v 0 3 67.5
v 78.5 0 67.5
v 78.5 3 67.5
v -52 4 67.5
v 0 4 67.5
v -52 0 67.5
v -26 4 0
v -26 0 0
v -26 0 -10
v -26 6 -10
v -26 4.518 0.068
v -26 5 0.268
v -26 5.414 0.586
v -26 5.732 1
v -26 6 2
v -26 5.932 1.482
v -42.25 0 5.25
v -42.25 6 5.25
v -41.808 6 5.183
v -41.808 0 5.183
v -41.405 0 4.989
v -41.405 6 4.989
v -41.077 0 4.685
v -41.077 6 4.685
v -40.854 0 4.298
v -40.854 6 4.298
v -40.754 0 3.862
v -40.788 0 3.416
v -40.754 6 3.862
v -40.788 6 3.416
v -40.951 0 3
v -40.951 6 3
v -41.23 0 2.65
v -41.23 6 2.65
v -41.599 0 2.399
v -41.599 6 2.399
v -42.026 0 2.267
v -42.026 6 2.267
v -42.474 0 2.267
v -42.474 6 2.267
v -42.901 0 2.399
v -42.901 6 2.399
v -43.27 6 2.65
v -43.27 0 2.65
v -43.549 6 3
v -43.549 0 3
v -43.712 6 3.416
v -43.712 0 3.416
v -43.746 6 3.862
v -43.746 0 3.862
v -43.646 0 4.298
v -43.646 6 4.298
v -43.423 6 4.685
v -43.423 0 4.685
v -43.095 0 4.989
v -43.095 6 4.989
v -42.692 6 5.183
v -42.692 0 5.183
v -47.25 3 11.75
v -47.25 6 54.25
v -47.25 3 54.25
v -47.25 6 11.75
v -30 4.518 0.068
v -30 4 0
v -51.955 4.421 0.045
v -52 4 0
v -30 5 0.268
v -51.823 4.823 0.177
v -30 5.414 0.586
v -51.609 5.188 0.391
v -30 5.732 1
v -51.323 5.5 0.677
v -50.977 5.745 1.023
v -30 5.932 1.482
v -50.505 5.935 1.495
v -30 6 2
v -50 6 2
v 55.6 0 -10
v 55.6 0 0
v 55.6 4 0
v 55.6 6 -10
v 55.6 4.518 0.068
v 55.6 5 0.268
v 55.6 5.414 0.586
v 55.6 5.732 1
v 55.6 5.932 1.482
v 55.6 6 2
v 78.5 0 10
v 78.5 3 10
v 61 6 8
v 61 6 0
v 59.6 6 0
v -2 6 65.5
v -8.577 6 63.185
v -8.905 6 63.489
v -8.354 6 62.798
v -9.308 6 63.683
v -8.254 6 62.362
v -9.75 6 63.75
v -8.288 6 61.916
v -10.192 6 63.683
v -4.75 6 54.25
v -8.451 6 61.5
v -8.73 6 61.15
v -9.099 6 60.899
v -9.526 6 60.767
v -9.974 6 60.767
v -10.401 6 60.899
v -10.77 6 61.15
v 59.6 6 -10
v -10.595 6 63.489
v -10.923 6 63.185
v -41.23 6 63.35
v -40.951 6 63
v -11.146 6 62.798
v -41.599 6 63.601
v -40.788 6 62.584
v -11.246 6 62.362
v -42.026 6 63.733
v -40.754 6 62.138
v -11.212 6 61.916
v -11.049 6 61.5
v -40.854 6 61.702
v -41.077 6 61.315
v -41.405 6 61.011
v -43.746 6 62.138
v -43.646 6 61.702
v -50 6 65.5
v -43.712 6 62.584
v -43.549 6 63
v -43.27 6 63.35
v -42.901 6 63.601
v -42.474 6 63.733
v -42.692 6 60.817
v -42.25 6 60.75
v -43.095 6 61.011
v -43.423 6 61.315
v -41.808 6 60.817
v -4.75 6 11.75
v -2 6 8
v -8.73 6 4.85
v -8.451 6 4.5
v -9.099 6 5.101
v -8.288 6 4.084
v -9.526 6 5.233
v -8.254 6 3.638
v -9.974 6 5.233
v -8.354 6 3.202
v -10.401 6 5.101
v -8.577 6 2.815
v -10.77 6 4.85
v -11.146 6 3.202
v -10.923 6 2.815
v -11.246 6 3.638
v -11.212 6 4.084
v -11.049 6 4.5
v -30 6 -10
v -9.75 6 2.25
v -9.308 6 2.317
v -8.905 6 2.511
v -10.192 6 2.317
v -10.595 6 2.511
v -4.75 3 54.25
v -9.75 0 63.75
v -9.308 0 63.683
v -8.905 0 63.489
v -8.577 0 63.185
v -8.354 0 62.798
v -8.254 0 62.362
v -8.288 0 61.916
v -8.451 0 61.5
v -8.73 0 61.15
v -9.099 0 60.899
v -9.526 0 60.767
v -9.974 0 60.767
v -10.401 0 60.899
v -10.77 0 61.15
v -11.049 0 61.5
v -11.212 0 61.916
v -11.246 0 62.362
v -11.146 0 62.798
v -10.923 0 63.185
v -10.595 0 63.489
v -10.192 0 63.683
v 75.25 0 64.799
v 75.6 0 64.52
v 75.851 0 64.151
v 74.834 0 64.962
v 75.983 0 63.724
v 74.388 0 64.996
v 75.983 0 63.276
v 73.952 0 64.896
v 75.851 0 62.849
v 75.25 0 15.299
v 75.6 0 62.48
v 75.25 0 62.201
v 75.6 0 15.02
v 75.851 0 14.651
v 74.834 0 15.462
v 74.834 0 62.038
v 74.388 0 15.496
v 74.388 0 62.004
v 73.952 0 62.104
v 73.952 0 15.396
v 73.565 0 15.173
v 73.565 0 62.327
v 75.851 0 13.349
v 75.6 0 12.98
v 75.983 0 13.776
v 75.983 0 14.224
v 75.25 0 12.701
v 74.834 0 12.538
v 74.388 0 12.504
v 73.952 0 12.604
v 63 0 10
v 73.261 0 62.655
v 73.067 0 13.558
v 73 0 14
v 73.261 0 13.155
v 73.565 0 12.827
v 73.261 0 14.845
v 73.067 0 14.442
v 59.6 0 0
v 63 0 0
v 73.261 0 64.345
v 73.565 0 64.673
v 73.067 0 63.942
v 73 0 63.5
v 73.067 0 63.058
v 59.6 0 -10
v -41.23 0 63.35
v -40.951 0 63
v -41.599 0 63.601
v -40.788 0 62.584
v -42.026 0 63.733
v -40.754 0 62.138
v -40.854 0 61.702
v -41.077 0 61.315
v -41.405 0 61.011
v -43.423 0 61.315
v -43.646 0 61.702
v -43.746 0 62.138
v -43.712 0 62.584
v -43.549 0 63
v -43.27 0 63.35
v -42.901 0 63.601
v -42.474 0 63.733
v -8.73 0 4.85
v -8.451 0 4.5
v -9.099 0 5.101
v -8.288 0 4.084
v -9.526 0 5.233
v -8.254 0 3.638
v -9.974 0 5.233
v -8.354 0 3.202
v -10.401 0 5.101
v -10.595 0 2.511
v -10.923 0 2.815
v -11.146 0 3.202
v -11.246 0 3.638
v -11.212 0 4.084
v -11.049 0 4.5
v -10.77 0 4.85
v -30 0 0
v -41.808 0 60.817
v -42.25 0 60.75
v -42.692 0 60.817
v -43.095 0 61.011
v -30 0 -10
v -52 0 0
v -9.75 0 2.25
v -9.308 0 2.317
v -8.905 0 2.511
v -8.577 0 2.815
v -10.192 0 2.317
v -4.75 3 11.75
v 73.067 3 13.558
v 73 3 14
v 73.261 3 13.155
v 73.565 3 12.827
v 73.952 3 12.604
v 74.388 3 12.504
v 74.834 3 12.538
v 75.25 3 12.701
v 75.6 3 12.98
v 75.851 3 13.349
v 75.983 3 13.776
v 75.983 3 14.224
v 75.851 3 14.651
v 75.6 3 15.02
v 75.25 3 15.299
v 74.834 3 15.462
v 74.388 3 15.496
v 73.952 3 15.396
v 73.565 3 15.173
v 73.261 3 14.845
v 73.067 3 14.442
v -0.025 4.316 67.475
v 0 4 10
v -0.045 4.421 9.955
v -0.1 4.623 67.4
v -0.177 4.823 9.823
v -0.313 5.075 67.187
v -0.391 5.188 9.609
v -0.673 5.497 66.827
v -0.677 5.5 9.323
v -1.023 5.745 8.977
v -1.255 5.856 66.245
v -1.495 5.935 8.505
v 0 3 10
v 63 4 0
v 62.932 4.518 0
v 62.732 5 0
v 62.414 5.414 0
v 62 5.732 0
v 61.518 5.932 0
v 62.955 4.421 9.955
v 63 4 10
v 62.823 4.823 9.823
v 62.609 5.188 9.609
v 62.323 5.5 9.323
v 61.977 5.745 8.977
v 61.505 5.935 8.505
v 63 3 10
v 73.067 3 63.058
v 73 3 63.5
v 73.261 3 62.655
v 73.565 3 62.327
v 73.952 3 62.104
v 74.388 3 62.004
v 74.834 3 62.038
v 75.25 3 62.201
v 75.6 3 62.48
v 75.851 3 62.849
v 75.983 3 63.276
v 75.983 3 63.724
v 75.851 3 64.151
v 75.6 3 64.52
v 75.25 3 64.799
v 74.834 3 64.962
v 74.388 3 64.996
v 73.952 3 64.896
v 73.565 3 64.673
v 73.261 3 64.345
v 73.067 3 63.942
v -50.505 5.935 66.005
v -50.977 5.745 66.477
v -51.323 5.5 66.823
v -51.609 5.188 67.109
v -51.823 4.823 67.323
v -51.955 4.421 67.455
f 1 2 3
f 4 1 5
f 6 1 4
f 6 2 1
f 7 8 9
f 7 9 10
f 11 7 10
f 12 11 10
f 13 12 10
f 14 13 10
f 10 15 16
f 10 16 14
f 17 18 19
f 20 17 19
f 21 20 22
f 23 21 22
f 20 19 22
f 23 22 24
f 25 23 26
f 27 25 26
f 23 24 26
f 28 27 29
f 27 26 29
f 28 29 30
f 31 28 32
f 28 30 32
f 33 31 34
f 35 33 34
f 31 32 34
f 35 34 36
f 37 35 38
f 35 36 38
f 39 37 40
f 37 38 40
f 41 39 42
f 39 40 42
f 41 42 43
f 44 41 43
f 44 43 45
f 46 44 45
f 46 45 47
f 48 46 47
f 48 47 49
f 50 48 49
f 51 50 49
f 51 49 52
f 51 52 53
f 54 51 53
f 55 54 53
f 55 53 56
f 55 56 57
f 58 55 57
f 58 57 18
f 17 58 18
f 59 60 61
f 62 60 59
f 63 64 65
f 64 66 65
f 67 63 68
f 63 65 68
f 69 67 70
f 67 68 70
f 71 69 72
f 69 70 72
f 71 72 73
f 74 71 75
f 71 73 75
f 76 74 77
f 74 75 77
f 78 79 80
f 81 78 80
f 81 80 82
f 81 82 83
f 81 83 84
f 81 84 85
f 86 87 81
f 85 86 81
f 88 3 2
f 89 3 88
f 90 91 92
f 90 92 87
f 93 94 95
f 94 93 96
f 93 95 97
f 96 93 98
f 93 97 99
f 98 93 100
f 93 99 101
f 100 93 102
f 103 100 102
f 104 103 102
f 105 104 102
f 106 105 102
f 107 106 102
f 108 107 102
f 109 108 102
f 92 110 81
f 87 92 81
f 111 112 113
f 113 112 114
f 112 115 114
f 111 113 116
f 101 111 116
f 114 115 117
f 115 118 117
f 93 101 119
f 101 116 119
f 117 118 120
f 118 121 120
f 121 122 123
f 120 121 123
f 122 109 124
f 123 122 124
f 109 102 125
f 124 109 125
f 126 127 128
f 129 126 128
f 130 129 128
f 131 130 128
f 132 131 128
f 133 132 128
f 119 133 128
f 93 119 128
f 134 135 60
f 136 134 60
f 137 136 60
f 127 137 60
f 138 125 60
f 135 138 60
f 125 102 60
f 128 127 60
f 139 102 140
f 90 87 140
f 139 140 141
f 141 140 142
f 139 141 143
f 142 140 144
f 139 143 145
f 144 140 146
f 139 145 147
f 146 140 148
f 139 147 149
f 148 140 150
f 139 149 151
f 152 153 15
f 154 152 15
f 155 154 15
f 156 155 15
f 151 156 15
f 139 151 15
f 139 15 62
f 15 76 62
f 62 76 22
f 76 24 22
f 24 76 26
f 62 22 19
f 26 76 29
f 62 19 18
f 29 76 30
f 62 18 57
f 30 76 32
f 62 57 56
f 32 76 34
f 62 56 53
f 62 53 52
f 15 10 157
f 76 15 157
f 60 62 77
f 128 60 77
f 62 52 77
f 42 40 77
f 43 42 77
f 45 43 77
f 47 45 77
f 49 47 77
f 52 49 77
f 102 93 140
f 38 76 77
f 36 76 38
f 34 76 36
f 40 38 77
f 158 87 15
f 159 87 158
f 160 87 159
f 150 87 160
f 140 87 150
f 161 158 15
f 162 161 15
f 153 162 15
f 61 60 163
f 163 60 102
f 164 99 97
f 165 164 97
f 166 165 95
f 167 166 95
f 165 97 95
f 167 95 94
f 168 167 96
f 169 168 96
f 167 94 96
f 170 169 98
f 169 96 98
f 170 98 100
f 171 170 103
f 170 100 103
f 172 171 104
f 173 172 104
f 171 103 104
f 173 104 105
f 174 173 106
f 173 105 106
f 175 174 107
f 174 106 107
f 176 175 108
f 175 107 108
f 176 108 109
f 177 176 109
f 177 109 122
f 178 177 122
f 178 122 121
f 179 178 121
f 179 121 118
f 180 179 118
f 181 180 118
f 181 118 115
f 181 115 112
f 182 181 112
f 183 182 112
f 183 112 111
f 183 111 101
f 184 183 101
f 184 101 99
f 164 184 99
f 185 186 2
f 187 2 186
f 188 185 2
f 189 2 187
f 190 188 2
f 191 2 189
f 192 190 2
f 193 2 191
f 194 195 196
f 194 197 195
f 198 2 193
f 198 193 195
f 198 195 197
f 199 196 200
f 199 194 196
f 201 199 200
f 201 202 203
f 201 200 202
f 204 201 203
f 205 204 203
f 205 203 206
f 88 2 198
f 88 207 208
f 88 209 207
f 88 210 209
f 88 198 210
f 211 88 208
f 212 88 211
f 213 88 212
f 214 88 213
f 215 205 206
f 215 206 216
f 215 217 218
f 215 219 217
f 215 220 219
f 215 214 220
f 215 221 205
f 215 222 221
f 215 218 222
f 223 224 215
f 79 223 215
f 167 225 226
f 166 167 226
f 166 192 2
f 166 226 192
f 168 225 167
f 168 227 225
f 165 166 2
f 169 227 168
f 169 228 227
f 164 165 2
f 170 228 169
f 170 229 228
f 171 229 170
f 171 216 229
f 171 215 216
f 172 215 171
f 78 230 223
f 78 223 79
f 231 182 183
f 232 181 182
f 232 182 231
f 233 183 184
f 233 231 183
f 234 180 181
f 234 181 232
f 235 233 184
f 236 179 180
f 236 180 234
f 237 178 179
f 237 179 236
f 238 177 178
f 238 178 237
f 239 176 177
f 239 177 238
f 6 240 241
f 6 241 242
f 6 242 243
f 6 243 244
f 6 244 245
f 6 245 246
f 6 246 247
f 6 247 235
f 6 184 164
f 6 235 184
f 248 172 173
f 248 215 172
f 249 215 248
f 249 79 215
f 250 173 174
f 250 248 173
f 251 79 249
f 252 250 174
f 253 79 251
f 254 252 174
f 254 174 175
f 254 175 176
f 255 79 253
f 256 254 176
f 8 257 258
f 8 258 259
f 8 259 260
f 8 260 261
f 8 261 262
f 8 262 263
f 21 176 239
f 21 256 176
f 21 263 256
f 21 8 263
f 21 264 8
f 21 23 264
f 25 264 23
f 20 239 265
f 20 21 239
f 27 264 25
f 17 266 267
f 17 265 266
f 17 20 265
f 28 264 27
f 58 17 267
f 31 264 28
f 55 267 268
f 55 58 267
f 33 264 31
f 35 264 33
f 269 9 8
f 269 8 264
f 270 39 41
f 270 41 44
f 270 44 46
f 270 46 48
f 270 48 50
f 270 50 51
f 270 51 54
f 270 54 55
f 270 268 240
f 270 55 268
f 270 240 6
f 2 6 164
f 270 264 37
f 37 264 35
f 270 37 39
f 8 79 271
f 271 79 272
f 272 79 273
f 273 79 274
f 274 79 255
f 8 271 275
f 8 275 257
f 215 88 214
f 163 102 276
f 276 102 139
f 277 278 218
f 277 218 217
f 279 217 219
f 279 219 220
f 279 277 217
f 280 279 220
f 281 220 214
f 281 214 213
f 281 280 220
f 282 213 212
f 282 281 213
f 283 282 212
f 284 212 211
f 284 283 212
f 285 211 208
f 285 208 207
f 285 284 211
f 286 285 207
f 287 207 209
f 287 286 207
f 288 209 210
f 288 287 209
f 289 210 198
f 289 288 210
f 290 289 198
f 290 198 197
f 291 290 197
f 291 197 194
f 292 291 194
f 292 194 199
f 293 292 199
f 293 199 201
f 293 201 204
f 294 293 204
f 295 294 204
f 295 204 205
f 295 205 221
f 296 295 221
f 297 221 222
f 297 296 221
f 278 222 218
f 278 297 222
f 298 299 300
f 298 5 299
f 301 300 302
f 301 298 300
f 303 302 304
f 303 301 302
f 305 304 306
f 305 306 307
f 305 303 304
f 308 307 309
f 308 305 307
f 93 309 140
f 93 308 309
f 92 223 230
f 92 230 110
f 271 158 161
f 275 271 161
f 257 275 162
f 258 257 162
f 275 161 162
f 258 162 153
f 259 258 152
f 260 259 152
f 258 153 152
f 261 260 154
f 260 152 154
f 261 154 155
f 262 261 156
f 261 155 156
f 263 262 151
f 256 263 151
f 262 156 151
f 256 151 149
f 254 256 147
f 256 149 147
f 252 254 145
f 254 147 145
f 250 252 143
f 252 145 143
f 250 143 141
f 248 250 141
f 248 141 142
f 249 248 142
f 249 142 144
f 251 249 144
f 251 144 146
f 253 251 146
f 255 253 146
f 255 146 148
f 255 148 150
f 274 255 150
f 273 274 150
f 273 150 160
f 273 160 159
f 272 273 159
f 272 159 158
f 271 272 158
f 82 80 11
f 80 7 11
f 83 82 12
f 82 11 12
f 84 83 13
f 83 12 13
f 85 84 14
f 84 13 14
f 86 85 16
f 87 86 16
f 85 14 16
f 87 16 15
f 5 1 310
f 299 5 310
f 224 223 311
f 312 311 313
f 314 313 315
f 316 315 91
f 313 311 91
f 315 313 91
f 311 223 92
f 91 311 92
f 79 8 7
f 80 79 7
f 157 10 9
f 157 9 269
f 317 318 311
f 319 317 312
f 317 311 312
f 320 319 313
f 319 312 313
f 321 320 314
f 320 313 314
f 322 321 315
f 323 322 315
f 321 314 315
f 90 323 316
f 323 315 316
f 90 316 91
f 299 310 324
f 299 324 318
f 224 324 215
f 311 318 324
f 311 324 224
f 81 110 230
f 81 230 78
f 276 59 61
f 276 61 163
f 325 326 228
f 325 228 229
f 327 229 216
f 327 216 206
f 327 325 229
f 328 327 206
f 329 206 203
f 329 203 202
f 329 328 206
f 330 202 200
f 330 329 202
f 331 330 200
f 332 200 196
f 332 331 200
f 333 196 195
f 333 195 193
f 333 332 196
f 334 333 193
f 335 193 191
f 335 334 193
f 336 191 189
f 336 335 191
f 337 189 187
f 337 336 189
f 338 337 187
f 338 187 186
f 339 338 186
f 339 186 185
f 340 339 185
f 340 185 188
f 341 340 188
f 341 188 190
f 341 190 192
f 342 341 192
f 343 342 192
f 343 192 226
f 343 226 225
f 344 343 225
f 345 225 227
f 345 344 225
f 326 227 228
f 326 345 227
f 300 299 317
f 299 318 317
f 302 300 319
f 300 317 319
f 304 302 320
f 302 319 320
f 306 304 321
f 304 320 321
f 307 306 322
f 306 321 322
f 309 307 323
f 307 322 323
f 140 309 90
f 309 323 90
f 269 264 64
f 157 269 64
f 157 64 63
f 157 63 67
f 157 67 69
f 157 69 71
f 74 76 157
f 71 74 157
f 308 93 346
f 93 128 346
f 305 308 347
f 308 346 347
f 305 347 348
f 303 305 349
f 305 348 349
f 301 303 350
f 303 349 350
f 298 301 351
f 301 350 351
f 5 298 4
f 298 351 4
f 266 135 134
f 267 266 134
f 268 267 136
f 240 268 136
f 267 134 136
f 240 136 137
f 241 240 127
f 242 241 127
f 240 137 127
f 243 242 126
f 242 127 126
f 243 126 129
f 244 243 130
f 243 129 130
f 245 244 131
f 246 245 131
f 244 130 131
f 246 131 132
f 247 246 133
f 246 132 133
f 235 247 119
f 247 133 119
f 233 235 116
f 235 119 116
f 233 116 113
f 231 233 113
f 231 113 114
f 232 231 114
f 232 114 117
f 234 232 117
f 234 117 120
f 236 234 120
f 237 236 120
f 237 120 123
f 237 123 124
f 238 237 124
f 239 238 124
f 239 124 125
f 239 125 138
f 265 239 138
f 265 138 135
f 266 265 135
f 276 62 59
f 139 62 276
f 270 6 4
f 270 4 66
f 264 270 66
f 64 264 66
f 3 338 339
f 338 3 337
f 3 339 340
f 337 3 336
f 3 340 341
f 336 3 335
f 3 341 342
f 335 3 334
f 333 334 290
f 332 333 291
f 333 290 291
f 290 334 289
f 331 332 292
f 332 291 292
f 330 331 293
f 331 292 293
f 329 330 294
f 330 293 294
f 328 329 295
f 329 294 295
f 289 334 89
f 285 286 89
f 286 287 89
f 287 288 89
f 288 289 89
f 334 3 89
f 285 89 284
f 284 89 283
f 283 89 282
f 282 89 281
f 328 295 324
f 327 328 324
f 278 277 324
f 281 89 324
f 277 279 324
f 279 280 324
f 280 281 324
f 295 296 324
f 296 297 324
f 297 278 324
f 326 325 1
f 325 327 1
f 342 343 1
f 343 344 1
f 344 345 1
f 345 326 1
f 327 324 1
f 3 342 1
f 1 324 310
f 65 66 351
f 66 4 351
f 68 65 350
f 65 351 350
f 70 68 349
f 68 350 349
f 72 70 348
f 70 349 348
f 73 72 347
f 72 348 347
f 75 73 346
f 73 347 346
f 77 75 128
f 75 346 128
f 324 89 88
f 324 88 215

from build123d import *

# Parameters (mm, degrees)
SKETCH1_W                 = 52
SKETCH1_H                 = 66
BOSS_EXTRUDE1_DEPTH       = 6
SKETCH2_W                 = 42.5
SKETCH2_H                 = 42.5
CUT_EXTRUDE1_DEPTH        = 3
SKETCH3_R                 = 1.5
CUT_EXTRUDE2_DEPTH        = 13
SKETCH4_W                 = 10
SKETCH4_H                 = 6
BOSS_EXTRUDE2_DEPTH       = 63
SKETCH5_W                 = 4
SKETCH5_H                 = 6
BOSS_EXTRUDE3_DEPTH       = 10
SKETCH6_R                 = 0.75
CUT_EXTRUDE3_DEPTH        = 114
BOSS_EXTRUDE4_START       = -3
BOSS_EXTRUDE4_OUTLINE_W   = 78.5
BOSS_EXTRUDE4_OUTLINE_H   = 57.5
BOSS_EXTRUDE4_OUTLINE_R   = 1.5
BOSS_EXTRUDE4_DEPTH       = 3
BOSS_EXTRUDE4_START_2     = -30
BOSS_EXTRUDE4_2_OUTLINE_R = 0.75
BOSS_EXTRUDE4_2_DEPTH     = 4
BOSS_EXTRUDE4_START_3     = 55.6
BOSS_EXTRUDE4_3_OUTLINE_R = 0.75
BOSS_EXTRUDE4_3_DEPTH     = 4
SKETCH8_W                 = 52
SKETCH8_H                 = 1.5
BOSS_EXTRUDE5_DEPTH       = 6
FILLET1_R                 = 2


# Read off the part's stored shape, not the designer's step: Boss-Extrude4
with BuildPart() as part:
    # Sketch1 → Boss-Extrude1 (new body)
    with BuildSketch(Plane(origin=(0, 0, 0), x_dir=(1, 0, 0), z_dir=(0, 1, 0))):
        with Locations((-26, -33)):
            Rectangle(SKETCH1_W, SKETCH1_H)
    extrude(amount=BOSS_EXTRUDE1_DEPTH)

    # Sketch2 → Cut-Extrude1 (cut)
    with BuildSketch(Plane(origin=(0, 6, 0), x_dir=(1, 0, 0), z_dir=(0, 1, 0))):
        with Locations((-26, -33)):
            Rectangle(SKETCH2_W, SKETCH2_H)
    extrude(amount=-CUT_EXTRUDE1_DEPTH, mode=Mode.SUBTRACT)

    # Sketch3 → Cut-Extrude2 (cut)
    with BuildSketch(Plane(origin=(0, 6, 0), x_dir=(1, 0, 0), z_dir=(0, 1, 0))):
        with Locations(Location((-42.25, -3.75, 0), (0, 0, 270))):
            Circle(SKETCH3_R)
        with Locations(Location((-9.75, -3.75, 0), (0, 0, 90))):
            Circle(SKETCH3_R)
        with Locations(Location((-9.75, -62.25, 0), (0, 0, 270))):
            Circle(SKETCH3_R)
        with Locations(Location((-42.25, -62.25, 0), (0, 0, 90))):
            Circle(SKETCH3_R)
    extrude(amount=-CUT_EXTRUDE2_DEPTH, mode=Mode.SUBTRACT)

    # Sketch4 → Boss-Extrude2 (add)
    with BuildSketch(Plane(origin=(0, 0, 0), x_dir=(0, 0, -1), z_dir=(1, 0, 0))):
        with Locations((-5, 3)):
            Rectangle(SKETCH4_W, SKETCH4_H)
    extrude(amount=BOSS_EXTRUDE2_DEPTH)

    # Sketch5 → Boss-Extrude3 (add)
    with BuildSketch(Plane(origin=(0, 0, 0), x_dir=(-1, 0, 0), z_dir=(0, 0, -1))):
        with Locations((28, 3)):
            Rectangle(SKETCH5_W, SKETCH5_H)
        with Locations((-57.6, 3)):
            Rectangle(SKETCH5_W, SKETCH5_H)
    extrude(amount=BOSS_EXTRUDE3_DEPTH)

    # Sketch6 → Cut-Extrude3 (cut)
    with BuildSketch(Plane(origin=(59.6, 0, 0), x_dir=(0, 0, -1), z_dir=(1, 0, 0))):
        with Locations((4, 1.5)):
            Circle(SKETCH6_R)
    extrude(amount=-CUT_EXTRUDE3_DEPTH, mode=Mode.SUBTRACT)

    # Boss-Extrude4 outline → Boss-Extrude4 (add)
    with BuildSketch(Plane(origin=(0, 0, 0), x_dir=(-1, 0, 0), z_dir=(0, -1, 0)).offset(BOSS_EXTRUDE4_START)):
        with Locations((-39.25, -38.75)):
            Rectangle(BOSS_EXTRUDE4_OUTLINE_W, BOSS_EXTRUDE4_OUTLINE_H)
        with Locations((-74.5, -63.5)):
            Circle(BOSS_EXTRUDE4_OUTLINE_R, mode=Mode.SUBTRACT)
        with Locations((-74.5, -14)):
            Circle(BOSS_EXTRUDE4_OUTLINE_R, mode=Mode.SUBTRACT)
    extrude(amount=BOSS_EXTRUDE4_DEPTH)

    # Boss-Extrude4 2 outline → Boss-Extrude4 2 (add)
    with BuildSketch(Plane.YZ.offset(BOSS_EXTRUDE4_START_2)):
        with Locations((1.5, -4)):
            Circle(BOSS_EXTRUDE4_2_OUTLINE_R)
    extrude(amount=BOSS_EXTRUDE4_2_DEPTH)

    # Boss-Extrude4 3 outline → Boss-Extrude4 3 (add)
    with BuildSketch(Plane.YZ.offset(BOSS_EXTRUDE4_START_3)):
        with Locations((1.5, -4)):
            Circle(BOSS_EXTRUDE4_3_OUTLINE_R)
    extrude(amount=BOSS_EXTRUDE4_3_DEPTH)

    # Sketch8 → Boss-Extrude5 (add)
    with BuildSketch(Plane(origin=(0, 0, 0), x_dir=(-1, 0, 0), z_dir=(0, -1, 0))):
        with Locations((26, -66.75)):
            Rectangle(SKETCH8_W, SKETCH8_H)
    extrude(amount=-BOSS_EXTRUDE5_DEPTH)

    # Fillet1
    fillet1_edges = [part.edges().sort_by_distance(p)[0] for p in [
        (-52, 6, 33.75),
        (-26, 6, 67.5),
        (0, 6, 38.75),
        (31.5, 6, 10),
        (63, 6, 5),
        (-41, 6, 0),
        (14.8, 6, 0),
    ]]
    fillet(fillet1_edges, radius=FILLET1_R)


solid = part.part
